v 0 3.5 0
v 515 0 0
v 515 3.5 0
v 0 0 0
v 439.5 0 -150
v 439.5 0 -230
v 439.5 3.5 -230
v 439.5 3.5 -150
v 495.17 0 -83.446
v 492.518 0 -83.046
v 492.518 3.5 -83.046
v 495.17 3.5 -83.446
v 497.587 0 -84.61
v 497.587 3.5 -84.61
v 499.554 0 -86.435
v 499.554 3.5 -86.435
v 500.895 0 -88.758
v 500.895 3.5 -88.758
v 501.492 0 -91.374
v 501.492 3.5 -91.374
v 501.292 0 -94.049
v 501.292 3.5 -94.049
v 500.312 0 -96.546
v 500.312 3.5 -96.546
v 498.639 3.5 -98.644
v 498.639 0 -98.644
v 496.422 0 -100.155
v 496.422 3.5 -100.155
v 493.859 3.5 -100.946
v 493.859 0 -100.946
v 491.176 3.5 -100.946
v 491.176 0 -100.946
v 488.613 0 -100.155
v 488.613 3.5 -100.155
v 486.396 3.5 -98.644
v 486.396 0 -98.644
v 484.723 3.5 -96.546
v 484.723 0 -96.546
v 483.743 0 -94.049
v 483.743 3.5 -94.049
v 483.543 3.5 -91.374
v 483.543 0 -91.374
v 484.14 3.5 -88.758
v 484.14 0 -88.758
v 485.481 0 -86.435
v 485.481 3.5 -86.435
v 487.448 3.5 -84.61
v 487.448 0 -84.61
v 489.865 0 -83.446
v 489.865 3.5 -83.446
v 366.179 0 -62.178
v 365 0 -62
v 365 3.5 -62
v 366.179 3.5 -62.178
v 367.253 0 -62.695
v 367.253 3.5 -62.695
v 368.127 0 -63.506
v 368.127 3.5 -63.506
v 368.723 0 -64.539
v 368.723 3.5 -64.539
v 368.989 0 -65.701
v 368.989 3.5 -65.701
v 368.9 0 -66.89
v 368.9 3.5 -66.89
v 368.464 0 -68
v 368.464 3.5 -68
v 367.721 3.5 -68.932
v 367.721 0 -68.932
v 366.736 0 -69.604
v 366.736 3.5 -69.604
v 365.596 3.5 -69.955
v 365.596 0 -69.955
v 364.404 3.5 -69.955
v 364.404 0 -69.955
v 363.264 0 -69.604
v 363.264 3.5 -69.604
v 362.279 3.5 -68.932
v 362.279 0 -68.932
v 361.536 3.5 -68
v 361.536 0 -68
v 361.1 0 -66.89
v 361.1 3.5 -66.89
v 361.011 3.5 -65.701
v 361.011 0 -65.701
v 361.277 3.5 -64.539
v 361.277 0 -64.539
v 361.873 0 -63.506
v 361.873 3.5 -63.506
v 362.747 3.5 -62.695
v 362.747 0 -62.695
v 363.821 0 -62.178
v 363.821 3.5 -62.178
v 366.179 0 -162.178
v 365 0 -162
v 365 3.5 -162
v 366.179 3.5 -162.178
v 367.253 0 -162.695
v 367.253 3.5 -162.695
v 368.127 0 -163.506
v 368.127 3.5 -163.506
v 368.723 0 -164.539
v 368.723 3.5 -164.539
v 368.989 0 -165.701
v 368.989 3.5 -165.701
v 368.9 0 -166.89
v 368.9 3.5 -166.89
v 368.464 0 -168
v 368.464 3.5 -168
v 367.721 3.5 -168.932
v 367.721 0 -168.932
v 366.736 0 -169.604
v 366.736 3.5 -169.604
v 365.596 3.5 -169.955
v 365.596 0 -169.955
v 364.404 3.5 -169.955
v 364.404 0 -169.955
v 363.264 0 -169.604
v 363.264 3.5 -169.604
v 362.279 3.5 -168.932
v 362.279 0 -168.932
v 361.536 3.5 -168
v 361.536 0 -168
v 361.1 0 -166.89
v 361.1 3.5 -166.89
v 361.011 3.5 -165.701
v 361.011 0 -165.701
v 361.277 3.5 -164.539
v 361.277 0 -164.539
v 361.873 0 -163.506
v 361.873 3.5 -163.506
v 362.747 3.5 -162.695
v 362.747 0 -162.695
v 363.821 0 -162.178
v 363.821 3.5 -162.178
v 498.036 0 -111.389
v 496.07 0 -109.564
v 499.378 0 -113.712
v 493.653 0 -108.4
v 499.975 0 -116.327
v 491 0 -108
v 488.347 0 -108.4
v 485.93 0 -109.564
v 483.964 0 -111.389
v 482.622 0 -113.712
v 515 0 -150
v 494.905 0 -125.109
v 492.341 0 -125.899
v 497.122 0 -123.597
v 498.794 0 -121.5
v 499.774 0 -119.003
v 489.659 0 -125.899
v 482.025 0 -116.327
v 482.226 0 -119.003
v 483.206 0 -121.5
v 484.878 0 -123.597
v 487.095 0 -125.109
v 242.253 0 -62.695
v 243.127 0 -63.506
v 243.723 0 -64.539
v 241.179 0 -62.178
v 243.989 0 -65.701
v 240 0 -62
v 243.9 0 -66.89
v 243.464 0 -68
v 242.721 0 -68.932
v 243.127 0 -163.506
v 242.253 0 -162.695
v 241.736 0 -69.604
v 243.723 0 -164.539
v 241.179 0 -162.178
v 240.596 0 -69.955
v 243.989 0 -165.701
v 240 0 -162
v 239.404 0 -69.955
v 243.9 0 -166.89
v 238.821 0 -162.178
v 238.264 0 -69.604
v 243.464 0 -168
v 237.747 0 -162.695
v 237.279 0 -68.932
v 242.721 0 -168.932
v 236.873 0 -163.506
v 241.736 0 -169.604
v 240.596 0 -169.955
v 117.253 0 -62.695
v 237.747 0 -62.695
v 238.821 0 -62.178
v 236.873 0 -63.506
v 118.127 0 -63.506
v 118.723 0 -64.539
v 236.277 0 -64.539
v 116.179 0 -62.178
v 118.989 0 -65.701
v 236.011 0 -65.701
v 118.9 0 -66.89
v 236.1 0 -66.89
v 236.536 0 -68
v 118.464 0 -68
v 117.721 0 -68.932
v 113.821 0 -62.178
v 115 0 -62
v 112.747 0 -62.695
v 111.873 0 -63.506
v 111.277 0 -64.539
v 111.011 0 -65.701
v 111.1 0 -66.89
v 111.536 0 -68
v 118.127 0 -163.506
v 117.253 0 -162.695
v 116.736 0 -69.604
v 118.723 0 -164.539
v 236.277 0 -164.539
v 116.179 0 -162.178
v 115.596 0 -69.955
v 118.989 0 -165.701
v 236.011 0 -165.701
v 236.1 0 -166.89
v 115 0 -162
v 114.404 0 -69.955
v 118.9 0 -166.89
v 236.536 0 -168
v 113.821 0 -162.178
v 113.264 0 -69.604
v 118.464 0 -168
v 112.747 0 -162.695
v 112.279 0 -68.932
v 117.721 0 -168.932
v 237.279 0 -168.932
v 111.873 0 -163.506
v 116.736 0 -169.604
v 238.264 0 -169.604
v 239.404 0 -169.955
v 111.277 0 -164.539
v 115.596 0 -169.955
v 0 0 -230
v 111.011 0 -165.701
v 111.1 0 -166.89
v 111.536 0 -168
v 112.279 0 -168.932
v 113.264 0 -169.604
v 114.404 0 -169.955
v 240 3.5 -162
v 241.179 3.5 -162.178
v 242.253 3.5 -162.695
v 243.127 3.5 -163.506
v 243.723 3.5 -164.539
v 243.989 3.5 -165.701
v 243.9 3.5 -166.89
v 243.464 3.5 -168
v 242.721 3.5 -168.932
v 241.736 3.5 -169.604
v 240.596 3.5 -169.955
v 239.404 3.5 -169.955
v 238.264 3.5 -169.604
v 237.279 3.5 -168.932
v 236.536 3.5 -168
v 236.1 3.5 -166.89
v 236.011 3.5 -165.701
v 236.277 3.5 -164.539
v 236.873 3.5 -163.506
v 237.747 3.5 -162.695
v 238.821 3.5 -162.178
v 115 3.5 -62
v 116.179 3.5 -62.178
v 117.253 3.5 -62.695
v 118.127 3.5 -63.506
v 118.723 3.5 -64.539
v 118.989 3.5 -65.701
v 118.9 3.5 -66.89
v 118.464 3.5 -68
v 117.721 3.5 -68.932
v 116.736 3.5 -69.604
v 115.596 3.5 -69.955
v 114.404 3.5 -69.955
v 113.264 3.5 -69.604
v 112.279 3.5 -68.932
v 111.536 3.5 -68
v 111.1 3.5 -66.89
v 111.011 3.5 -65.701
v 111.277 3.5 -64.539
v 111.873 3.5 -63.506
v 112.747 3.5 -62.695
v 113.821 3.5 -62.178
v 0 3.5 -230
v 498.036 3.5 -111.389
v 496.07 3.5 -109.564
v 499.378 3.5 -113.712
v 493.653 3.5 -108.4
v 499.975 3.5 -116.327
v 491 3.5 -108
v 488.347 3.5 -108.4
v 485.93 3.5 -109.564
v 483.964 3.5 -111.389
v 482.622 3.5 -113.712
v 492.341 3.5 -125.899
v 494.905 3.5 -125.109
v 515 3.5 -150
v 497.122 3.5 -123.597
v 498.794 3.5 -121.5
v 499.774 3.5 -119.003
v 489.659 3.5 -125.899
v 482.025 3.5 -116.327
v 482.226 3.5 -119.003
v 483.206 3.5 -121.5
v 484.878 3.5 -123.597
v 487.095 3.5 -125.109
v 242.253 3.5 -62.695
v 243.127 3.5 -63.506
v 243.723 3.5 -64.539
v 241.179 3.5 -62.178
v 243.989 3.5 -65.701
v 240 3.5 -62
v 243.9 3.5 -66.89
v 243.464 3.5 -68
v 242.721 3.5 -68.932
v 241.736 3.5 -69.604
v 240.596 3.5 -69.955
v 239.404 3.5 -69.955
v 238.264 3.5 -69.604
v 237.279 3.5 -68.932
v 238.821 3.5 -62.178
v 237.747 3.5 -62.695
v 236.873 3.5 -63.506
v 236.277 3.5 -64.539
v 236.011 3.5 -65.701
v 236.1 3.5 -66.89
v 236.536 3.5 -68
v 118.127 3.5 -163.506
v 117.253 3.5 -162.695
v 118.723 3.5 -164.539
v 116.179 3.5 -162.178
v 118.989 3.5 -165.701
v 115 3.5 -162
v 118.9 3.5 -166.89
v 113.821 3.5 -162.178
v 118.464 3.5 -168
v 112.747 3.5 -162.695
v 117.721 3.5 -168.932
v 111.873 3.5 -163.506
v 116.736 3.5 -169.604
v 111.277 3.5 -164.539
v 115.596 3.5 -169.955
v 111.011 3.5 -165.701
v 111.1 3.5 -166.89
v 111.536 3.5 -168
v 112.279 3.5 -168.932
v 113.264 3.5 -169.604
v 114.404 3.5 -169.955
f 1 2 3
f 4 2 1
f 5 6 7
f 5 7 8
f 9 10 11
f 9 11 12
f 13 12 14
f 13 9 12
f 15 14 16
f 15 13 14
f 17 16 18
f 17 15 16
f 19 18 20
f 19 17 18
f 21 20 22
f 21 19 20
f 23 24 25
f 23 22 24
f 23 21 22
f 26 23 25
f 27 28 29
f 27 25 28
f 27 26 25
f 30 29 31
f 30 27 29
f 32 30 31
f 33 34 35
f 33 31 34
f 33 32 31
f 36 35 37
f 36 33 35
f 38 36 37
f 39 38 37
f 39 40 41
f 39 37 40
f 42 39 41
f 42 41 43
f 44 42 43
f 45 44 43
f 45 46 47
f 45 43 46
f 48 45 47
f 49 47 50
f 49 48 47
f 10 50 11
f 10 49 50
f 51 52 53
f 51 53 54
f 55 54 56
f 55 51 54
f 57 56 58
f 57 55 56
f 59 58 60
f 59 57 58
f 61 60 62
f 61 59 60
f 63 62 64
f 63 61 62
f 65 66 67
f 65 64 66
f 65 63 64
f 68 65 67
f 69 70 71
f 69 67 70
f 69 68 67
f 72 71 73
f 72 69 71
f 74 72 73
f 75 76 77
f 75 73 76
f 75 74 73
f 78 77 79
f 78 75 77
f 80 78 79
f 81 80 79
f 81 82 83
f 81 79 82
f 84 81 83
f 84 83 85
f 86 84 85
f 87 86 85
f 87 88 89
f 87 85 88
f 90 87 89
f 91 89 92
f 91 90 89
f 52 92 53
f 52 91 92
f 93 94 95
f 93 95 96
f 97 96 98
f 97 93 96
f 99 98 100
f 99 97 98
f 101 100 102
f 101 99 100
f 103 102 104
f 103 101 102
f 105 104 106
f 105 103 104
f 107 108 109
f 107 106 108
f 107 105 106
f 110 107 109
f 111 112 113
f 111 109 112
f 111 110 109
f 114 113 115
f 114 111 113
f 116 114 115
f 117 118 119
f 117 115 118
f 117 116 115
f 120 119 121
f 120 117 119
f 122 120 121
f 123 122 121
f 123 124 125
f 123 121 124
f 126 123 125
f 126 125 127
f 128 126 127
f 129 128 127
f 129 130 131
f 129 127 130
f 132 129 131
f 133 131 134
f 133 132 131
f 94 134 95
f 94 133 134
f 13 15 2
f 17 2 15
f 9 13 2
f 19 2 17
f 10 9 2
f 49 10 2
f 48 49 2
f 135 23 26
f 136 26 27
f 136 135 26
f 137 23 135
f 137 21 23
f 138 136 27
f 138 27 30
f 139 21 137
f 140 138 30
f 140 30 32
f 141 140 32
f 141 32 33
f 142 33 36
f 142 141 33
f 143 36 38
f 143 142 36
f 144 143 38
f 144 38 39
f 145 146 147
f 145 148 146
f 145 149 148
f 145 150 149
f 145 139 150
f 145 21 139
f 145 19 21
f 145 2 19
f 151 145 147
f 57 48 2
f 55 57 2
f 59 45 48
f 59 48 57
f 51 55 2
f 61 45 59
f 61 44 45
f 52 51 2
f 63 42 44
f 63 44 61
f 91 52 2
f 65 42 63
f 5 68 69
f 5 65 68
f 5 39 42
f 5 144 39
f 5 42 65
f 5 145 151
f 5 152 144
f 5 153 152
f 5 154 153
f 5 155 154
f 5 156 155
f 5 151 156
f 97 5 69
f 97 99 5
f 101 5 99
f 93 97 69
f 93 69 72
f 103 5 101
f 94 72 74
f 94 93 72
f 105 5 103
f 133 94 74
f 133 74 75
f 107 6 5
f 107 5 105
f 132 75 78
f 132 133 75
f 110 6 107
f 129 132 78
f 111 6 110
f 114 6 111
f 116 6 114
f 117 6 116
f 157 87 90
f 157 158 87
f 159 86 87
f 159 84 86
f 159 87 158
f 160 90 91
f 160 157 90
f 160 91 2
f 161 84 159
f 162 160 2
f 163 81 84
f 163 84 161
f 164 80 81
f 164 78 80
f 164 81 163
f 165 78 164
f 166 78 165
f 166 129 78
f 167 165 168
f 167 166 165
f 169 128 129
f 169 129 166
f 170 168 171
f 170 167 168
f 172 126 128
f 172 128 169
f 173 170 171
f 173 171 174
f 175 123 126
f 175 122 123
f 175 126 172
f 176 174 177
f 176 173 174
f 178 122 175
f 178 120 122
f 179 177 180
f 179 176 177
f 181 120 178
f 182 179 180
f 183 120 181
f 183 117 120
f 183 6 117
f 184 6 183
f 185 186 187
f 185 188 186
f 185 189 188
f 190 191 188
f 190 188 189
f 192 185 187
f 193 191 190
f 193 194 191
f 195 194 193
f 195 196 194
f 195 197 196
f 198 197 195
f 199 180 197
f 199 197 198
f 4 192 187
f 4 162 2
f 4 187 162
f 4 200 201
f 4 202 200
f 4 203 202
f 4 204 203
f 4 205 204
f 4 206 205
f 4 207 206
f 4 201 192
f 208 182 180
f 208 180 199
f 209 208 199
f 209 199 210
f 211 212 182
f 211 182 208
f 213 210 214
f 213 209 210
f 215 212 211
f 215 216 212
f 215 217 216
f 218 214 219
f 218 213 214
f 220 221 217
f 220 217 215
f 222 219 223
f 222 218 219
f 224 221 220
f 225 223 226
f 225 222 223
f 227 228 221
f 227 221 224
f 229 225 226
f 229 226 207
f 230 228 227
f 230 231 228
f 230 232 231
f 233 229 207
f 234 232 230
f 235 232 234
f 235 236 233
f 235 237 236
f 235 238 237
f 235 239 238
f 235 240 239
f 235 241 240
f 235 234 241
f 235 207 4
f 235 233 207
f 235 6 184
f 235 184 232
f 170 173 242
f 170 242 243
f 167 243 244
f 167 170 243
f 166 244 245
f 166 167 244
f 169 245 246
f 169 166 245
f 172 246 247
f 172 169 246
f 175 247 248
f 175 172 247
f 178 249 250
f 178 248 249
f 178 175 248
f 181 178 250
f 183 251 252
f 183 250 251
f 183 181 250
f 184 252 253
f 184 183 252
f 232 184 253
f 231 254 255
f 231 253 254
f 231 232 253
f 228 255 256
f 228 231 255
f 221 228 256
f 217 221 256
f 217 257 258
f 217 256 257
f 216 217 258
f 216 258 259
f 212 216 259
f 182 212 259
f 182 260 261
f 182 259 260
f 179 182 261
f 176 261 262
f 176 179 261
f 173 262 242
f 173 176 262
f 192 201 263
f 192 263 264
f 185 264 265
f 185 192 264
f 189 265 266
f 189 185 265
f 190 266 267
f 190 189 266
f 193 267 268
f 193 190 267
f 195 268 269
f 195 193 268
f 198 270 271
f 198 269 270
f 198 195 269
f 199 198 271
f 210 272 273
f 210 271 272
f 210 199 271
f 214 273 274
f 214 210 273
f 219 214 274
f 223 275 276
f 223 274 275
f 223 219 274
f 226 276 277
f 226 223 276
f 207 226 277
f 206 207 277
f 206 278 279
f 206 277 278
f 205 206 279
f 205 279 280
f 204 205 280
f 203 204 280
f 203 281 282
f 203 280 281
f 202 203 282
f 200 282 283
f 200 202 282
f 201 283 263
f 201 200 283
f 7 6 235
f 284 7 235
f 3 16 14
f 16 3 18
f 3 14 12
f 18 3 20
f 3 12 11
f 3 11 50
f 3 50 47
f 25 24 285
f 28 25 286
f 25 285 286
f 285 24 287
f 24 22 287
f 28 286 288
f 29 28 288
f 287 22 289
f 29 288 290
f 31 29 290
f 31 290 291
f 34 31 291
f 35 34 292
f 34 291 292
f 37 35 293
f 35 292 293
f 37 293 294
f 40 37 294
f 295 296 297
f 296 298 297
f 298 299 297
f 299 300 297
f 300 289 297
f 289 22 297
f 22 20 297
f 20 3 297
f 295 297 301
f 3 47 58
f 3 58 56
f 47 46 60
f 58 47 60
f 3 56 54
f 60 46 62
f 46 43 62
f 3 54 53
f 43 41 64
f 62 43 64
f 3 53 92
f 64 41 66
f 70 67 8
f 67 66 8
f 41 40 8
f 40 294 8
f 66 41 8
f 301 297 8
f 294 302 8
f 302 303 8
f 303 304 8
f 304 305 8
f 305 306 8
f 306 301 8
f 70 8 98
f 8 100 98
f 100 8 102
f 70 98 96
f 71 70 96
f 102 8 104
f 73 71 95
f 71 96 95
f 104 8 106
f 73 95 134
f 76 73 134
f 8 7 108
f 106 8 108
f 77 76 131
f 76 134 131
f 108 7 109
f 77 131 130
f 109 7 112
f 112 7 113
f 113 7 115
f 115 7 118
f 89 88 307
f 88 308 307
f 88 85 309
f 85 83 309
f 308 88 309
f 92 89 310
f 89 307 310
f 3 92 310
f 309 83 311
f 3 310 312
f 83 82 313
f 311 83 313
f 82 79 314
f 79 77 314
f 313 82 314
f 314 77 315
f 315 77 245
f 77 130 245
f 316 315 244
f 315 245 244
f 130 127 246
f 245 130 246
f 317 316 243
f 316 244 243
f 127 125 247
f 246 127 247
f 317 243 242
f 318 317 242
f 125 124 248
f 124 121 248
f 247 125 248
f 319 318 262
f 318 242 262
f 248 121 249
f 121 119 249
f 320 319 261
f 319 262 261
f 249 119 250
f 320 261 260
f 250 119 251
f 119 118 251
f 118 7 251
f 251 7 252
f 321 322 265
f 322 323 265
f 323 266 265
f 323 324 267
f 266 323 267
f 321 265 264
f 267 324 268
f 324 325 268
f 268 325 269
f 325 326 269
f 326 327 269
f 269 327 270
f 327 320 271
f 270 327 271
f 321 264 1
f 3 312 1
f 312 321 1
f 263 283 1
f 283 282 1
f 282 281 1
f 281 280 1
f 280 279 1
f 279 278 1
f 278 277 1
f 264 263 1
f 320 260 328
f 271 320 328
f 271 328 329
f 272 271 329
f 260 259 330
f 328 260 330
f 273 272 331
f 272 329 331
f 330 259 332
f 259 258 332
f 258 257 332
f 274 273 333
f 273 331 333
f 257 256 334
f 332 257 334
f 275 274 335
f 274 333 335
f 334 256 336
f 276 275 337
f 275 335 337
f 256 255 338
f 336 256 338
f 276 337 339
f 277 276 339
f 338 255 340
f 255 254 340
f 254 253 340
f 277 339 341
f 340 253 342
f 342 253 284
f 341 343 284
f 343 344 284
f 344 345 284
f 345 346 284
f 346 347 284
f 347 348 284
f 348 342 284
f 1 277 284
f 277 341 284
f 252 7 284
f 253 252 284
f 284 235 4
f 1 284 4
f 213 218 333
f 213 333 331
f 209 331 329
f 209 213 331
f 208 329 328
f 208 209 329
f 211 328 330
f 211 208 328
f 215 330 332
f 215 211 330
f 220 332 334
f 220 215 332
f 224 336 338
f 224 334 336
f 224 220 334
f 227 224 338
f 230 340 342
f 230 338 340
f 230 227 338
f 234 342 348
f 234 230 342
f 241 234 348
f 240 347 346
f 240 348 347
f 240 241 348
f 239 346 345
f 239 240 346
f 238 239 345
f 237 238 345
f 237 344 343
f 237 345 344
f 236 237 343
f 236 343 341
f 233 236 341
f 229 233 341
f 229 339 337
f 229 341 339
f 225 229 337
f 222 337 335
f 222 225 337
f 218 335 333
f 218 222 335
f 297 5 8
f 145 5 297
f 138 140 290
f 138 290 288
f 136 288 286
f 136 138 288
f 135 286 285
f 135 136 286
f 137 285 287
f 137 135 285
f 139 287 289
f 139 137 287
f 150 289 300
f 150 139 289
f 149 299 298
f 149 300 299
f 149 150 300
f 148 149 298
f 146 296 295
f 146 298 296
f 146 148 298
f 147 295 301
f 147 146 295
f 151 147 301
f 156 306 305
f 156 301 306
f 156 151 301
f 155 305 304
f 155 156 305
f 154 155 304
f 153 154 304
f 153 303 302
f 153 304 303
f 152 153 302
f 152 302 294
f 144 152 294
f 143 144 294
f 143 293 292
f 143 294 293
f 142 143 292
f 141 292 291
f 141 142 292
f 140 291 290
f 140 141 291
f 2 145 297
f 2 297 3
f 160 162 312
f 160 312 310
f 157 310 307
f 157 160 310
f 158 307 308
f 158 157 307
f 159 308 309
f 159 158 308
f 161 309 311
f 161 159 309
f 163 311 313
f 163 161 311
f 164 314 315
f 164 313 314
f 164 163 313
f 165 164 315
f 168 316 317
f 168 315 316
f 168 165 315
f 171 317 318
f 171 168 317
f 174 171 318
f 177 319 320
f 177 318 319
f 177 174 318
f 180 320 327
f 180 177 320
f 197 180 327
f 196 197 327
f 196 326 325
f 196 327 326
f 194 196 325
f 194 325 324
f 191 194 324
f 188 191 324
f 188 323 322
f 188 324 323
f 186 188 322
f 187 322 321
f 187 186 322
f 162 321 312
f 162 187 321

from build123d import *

# Parameters (mm, degrees)
BOSS_EXTRUDE1_DEPTH     = 3.5
CUT_EXTRUDE1_DEPTH      = 565.036567963
CUT_EXTRUDE1_DEPTH_BACK = 565.036567963
SKETCH2_R               = 4
SKETCH2_R_2             = 9


with BuildPart() as part:
    # Sketch1 → Boss-Extrude1 (new body)
    with BuildSketch(Plane(origin=(0, 0, 0), x_dir=(1, 0, 0), z_dir=(0, 1, 0))):
        Polygon((0, 0), (0, 150), (0, 230), (20, 230), (439.5, 230), (439.5, 150), (515, 150), (515, 0), align=None)
    extrude(amount=BOSS_EXTRUDE1_DEPTH)

    # Sketch2 → Cut-Extrude1 (cut, two sides: drawn at the far end of the back side and taken through both)
    with BuildSketch(Plane(origin=(0, 3.5, 0), x_dir=(1, 0, 0), z_dir=(0, 1, 0)).offset(-CUT_EXTRUDE1_DEPTH_BACK)):
        with Locations((115, 166)):
            Circle(SKETCH2_R)
        with Locations((240, 166)):
            Circle(SKETCH2_R)
        with Locations((365, 166)):
            Circle(SKETCH2_R)
        with Locations((365, 66)):
            Circle(SKETCH2_R)
        with Locations((240, 66)):
            Circle(SKETCH2_R)
        with Locations((115, 66)):
            Circle(SKETCH2_R)
        with Locations((492.517503026, 92.046098811)):
            Circle(SKETCH2_R_2)
        with Locations((491, 117)):
            Circle(SKETCH2_R_2)
    extrude(amount=CUT_EXTRUDE1_DEPTH + CUT_EXTRUDE1_DEPTH_BACK, mode=Mode.SUBTRACT)


solid = part.part
